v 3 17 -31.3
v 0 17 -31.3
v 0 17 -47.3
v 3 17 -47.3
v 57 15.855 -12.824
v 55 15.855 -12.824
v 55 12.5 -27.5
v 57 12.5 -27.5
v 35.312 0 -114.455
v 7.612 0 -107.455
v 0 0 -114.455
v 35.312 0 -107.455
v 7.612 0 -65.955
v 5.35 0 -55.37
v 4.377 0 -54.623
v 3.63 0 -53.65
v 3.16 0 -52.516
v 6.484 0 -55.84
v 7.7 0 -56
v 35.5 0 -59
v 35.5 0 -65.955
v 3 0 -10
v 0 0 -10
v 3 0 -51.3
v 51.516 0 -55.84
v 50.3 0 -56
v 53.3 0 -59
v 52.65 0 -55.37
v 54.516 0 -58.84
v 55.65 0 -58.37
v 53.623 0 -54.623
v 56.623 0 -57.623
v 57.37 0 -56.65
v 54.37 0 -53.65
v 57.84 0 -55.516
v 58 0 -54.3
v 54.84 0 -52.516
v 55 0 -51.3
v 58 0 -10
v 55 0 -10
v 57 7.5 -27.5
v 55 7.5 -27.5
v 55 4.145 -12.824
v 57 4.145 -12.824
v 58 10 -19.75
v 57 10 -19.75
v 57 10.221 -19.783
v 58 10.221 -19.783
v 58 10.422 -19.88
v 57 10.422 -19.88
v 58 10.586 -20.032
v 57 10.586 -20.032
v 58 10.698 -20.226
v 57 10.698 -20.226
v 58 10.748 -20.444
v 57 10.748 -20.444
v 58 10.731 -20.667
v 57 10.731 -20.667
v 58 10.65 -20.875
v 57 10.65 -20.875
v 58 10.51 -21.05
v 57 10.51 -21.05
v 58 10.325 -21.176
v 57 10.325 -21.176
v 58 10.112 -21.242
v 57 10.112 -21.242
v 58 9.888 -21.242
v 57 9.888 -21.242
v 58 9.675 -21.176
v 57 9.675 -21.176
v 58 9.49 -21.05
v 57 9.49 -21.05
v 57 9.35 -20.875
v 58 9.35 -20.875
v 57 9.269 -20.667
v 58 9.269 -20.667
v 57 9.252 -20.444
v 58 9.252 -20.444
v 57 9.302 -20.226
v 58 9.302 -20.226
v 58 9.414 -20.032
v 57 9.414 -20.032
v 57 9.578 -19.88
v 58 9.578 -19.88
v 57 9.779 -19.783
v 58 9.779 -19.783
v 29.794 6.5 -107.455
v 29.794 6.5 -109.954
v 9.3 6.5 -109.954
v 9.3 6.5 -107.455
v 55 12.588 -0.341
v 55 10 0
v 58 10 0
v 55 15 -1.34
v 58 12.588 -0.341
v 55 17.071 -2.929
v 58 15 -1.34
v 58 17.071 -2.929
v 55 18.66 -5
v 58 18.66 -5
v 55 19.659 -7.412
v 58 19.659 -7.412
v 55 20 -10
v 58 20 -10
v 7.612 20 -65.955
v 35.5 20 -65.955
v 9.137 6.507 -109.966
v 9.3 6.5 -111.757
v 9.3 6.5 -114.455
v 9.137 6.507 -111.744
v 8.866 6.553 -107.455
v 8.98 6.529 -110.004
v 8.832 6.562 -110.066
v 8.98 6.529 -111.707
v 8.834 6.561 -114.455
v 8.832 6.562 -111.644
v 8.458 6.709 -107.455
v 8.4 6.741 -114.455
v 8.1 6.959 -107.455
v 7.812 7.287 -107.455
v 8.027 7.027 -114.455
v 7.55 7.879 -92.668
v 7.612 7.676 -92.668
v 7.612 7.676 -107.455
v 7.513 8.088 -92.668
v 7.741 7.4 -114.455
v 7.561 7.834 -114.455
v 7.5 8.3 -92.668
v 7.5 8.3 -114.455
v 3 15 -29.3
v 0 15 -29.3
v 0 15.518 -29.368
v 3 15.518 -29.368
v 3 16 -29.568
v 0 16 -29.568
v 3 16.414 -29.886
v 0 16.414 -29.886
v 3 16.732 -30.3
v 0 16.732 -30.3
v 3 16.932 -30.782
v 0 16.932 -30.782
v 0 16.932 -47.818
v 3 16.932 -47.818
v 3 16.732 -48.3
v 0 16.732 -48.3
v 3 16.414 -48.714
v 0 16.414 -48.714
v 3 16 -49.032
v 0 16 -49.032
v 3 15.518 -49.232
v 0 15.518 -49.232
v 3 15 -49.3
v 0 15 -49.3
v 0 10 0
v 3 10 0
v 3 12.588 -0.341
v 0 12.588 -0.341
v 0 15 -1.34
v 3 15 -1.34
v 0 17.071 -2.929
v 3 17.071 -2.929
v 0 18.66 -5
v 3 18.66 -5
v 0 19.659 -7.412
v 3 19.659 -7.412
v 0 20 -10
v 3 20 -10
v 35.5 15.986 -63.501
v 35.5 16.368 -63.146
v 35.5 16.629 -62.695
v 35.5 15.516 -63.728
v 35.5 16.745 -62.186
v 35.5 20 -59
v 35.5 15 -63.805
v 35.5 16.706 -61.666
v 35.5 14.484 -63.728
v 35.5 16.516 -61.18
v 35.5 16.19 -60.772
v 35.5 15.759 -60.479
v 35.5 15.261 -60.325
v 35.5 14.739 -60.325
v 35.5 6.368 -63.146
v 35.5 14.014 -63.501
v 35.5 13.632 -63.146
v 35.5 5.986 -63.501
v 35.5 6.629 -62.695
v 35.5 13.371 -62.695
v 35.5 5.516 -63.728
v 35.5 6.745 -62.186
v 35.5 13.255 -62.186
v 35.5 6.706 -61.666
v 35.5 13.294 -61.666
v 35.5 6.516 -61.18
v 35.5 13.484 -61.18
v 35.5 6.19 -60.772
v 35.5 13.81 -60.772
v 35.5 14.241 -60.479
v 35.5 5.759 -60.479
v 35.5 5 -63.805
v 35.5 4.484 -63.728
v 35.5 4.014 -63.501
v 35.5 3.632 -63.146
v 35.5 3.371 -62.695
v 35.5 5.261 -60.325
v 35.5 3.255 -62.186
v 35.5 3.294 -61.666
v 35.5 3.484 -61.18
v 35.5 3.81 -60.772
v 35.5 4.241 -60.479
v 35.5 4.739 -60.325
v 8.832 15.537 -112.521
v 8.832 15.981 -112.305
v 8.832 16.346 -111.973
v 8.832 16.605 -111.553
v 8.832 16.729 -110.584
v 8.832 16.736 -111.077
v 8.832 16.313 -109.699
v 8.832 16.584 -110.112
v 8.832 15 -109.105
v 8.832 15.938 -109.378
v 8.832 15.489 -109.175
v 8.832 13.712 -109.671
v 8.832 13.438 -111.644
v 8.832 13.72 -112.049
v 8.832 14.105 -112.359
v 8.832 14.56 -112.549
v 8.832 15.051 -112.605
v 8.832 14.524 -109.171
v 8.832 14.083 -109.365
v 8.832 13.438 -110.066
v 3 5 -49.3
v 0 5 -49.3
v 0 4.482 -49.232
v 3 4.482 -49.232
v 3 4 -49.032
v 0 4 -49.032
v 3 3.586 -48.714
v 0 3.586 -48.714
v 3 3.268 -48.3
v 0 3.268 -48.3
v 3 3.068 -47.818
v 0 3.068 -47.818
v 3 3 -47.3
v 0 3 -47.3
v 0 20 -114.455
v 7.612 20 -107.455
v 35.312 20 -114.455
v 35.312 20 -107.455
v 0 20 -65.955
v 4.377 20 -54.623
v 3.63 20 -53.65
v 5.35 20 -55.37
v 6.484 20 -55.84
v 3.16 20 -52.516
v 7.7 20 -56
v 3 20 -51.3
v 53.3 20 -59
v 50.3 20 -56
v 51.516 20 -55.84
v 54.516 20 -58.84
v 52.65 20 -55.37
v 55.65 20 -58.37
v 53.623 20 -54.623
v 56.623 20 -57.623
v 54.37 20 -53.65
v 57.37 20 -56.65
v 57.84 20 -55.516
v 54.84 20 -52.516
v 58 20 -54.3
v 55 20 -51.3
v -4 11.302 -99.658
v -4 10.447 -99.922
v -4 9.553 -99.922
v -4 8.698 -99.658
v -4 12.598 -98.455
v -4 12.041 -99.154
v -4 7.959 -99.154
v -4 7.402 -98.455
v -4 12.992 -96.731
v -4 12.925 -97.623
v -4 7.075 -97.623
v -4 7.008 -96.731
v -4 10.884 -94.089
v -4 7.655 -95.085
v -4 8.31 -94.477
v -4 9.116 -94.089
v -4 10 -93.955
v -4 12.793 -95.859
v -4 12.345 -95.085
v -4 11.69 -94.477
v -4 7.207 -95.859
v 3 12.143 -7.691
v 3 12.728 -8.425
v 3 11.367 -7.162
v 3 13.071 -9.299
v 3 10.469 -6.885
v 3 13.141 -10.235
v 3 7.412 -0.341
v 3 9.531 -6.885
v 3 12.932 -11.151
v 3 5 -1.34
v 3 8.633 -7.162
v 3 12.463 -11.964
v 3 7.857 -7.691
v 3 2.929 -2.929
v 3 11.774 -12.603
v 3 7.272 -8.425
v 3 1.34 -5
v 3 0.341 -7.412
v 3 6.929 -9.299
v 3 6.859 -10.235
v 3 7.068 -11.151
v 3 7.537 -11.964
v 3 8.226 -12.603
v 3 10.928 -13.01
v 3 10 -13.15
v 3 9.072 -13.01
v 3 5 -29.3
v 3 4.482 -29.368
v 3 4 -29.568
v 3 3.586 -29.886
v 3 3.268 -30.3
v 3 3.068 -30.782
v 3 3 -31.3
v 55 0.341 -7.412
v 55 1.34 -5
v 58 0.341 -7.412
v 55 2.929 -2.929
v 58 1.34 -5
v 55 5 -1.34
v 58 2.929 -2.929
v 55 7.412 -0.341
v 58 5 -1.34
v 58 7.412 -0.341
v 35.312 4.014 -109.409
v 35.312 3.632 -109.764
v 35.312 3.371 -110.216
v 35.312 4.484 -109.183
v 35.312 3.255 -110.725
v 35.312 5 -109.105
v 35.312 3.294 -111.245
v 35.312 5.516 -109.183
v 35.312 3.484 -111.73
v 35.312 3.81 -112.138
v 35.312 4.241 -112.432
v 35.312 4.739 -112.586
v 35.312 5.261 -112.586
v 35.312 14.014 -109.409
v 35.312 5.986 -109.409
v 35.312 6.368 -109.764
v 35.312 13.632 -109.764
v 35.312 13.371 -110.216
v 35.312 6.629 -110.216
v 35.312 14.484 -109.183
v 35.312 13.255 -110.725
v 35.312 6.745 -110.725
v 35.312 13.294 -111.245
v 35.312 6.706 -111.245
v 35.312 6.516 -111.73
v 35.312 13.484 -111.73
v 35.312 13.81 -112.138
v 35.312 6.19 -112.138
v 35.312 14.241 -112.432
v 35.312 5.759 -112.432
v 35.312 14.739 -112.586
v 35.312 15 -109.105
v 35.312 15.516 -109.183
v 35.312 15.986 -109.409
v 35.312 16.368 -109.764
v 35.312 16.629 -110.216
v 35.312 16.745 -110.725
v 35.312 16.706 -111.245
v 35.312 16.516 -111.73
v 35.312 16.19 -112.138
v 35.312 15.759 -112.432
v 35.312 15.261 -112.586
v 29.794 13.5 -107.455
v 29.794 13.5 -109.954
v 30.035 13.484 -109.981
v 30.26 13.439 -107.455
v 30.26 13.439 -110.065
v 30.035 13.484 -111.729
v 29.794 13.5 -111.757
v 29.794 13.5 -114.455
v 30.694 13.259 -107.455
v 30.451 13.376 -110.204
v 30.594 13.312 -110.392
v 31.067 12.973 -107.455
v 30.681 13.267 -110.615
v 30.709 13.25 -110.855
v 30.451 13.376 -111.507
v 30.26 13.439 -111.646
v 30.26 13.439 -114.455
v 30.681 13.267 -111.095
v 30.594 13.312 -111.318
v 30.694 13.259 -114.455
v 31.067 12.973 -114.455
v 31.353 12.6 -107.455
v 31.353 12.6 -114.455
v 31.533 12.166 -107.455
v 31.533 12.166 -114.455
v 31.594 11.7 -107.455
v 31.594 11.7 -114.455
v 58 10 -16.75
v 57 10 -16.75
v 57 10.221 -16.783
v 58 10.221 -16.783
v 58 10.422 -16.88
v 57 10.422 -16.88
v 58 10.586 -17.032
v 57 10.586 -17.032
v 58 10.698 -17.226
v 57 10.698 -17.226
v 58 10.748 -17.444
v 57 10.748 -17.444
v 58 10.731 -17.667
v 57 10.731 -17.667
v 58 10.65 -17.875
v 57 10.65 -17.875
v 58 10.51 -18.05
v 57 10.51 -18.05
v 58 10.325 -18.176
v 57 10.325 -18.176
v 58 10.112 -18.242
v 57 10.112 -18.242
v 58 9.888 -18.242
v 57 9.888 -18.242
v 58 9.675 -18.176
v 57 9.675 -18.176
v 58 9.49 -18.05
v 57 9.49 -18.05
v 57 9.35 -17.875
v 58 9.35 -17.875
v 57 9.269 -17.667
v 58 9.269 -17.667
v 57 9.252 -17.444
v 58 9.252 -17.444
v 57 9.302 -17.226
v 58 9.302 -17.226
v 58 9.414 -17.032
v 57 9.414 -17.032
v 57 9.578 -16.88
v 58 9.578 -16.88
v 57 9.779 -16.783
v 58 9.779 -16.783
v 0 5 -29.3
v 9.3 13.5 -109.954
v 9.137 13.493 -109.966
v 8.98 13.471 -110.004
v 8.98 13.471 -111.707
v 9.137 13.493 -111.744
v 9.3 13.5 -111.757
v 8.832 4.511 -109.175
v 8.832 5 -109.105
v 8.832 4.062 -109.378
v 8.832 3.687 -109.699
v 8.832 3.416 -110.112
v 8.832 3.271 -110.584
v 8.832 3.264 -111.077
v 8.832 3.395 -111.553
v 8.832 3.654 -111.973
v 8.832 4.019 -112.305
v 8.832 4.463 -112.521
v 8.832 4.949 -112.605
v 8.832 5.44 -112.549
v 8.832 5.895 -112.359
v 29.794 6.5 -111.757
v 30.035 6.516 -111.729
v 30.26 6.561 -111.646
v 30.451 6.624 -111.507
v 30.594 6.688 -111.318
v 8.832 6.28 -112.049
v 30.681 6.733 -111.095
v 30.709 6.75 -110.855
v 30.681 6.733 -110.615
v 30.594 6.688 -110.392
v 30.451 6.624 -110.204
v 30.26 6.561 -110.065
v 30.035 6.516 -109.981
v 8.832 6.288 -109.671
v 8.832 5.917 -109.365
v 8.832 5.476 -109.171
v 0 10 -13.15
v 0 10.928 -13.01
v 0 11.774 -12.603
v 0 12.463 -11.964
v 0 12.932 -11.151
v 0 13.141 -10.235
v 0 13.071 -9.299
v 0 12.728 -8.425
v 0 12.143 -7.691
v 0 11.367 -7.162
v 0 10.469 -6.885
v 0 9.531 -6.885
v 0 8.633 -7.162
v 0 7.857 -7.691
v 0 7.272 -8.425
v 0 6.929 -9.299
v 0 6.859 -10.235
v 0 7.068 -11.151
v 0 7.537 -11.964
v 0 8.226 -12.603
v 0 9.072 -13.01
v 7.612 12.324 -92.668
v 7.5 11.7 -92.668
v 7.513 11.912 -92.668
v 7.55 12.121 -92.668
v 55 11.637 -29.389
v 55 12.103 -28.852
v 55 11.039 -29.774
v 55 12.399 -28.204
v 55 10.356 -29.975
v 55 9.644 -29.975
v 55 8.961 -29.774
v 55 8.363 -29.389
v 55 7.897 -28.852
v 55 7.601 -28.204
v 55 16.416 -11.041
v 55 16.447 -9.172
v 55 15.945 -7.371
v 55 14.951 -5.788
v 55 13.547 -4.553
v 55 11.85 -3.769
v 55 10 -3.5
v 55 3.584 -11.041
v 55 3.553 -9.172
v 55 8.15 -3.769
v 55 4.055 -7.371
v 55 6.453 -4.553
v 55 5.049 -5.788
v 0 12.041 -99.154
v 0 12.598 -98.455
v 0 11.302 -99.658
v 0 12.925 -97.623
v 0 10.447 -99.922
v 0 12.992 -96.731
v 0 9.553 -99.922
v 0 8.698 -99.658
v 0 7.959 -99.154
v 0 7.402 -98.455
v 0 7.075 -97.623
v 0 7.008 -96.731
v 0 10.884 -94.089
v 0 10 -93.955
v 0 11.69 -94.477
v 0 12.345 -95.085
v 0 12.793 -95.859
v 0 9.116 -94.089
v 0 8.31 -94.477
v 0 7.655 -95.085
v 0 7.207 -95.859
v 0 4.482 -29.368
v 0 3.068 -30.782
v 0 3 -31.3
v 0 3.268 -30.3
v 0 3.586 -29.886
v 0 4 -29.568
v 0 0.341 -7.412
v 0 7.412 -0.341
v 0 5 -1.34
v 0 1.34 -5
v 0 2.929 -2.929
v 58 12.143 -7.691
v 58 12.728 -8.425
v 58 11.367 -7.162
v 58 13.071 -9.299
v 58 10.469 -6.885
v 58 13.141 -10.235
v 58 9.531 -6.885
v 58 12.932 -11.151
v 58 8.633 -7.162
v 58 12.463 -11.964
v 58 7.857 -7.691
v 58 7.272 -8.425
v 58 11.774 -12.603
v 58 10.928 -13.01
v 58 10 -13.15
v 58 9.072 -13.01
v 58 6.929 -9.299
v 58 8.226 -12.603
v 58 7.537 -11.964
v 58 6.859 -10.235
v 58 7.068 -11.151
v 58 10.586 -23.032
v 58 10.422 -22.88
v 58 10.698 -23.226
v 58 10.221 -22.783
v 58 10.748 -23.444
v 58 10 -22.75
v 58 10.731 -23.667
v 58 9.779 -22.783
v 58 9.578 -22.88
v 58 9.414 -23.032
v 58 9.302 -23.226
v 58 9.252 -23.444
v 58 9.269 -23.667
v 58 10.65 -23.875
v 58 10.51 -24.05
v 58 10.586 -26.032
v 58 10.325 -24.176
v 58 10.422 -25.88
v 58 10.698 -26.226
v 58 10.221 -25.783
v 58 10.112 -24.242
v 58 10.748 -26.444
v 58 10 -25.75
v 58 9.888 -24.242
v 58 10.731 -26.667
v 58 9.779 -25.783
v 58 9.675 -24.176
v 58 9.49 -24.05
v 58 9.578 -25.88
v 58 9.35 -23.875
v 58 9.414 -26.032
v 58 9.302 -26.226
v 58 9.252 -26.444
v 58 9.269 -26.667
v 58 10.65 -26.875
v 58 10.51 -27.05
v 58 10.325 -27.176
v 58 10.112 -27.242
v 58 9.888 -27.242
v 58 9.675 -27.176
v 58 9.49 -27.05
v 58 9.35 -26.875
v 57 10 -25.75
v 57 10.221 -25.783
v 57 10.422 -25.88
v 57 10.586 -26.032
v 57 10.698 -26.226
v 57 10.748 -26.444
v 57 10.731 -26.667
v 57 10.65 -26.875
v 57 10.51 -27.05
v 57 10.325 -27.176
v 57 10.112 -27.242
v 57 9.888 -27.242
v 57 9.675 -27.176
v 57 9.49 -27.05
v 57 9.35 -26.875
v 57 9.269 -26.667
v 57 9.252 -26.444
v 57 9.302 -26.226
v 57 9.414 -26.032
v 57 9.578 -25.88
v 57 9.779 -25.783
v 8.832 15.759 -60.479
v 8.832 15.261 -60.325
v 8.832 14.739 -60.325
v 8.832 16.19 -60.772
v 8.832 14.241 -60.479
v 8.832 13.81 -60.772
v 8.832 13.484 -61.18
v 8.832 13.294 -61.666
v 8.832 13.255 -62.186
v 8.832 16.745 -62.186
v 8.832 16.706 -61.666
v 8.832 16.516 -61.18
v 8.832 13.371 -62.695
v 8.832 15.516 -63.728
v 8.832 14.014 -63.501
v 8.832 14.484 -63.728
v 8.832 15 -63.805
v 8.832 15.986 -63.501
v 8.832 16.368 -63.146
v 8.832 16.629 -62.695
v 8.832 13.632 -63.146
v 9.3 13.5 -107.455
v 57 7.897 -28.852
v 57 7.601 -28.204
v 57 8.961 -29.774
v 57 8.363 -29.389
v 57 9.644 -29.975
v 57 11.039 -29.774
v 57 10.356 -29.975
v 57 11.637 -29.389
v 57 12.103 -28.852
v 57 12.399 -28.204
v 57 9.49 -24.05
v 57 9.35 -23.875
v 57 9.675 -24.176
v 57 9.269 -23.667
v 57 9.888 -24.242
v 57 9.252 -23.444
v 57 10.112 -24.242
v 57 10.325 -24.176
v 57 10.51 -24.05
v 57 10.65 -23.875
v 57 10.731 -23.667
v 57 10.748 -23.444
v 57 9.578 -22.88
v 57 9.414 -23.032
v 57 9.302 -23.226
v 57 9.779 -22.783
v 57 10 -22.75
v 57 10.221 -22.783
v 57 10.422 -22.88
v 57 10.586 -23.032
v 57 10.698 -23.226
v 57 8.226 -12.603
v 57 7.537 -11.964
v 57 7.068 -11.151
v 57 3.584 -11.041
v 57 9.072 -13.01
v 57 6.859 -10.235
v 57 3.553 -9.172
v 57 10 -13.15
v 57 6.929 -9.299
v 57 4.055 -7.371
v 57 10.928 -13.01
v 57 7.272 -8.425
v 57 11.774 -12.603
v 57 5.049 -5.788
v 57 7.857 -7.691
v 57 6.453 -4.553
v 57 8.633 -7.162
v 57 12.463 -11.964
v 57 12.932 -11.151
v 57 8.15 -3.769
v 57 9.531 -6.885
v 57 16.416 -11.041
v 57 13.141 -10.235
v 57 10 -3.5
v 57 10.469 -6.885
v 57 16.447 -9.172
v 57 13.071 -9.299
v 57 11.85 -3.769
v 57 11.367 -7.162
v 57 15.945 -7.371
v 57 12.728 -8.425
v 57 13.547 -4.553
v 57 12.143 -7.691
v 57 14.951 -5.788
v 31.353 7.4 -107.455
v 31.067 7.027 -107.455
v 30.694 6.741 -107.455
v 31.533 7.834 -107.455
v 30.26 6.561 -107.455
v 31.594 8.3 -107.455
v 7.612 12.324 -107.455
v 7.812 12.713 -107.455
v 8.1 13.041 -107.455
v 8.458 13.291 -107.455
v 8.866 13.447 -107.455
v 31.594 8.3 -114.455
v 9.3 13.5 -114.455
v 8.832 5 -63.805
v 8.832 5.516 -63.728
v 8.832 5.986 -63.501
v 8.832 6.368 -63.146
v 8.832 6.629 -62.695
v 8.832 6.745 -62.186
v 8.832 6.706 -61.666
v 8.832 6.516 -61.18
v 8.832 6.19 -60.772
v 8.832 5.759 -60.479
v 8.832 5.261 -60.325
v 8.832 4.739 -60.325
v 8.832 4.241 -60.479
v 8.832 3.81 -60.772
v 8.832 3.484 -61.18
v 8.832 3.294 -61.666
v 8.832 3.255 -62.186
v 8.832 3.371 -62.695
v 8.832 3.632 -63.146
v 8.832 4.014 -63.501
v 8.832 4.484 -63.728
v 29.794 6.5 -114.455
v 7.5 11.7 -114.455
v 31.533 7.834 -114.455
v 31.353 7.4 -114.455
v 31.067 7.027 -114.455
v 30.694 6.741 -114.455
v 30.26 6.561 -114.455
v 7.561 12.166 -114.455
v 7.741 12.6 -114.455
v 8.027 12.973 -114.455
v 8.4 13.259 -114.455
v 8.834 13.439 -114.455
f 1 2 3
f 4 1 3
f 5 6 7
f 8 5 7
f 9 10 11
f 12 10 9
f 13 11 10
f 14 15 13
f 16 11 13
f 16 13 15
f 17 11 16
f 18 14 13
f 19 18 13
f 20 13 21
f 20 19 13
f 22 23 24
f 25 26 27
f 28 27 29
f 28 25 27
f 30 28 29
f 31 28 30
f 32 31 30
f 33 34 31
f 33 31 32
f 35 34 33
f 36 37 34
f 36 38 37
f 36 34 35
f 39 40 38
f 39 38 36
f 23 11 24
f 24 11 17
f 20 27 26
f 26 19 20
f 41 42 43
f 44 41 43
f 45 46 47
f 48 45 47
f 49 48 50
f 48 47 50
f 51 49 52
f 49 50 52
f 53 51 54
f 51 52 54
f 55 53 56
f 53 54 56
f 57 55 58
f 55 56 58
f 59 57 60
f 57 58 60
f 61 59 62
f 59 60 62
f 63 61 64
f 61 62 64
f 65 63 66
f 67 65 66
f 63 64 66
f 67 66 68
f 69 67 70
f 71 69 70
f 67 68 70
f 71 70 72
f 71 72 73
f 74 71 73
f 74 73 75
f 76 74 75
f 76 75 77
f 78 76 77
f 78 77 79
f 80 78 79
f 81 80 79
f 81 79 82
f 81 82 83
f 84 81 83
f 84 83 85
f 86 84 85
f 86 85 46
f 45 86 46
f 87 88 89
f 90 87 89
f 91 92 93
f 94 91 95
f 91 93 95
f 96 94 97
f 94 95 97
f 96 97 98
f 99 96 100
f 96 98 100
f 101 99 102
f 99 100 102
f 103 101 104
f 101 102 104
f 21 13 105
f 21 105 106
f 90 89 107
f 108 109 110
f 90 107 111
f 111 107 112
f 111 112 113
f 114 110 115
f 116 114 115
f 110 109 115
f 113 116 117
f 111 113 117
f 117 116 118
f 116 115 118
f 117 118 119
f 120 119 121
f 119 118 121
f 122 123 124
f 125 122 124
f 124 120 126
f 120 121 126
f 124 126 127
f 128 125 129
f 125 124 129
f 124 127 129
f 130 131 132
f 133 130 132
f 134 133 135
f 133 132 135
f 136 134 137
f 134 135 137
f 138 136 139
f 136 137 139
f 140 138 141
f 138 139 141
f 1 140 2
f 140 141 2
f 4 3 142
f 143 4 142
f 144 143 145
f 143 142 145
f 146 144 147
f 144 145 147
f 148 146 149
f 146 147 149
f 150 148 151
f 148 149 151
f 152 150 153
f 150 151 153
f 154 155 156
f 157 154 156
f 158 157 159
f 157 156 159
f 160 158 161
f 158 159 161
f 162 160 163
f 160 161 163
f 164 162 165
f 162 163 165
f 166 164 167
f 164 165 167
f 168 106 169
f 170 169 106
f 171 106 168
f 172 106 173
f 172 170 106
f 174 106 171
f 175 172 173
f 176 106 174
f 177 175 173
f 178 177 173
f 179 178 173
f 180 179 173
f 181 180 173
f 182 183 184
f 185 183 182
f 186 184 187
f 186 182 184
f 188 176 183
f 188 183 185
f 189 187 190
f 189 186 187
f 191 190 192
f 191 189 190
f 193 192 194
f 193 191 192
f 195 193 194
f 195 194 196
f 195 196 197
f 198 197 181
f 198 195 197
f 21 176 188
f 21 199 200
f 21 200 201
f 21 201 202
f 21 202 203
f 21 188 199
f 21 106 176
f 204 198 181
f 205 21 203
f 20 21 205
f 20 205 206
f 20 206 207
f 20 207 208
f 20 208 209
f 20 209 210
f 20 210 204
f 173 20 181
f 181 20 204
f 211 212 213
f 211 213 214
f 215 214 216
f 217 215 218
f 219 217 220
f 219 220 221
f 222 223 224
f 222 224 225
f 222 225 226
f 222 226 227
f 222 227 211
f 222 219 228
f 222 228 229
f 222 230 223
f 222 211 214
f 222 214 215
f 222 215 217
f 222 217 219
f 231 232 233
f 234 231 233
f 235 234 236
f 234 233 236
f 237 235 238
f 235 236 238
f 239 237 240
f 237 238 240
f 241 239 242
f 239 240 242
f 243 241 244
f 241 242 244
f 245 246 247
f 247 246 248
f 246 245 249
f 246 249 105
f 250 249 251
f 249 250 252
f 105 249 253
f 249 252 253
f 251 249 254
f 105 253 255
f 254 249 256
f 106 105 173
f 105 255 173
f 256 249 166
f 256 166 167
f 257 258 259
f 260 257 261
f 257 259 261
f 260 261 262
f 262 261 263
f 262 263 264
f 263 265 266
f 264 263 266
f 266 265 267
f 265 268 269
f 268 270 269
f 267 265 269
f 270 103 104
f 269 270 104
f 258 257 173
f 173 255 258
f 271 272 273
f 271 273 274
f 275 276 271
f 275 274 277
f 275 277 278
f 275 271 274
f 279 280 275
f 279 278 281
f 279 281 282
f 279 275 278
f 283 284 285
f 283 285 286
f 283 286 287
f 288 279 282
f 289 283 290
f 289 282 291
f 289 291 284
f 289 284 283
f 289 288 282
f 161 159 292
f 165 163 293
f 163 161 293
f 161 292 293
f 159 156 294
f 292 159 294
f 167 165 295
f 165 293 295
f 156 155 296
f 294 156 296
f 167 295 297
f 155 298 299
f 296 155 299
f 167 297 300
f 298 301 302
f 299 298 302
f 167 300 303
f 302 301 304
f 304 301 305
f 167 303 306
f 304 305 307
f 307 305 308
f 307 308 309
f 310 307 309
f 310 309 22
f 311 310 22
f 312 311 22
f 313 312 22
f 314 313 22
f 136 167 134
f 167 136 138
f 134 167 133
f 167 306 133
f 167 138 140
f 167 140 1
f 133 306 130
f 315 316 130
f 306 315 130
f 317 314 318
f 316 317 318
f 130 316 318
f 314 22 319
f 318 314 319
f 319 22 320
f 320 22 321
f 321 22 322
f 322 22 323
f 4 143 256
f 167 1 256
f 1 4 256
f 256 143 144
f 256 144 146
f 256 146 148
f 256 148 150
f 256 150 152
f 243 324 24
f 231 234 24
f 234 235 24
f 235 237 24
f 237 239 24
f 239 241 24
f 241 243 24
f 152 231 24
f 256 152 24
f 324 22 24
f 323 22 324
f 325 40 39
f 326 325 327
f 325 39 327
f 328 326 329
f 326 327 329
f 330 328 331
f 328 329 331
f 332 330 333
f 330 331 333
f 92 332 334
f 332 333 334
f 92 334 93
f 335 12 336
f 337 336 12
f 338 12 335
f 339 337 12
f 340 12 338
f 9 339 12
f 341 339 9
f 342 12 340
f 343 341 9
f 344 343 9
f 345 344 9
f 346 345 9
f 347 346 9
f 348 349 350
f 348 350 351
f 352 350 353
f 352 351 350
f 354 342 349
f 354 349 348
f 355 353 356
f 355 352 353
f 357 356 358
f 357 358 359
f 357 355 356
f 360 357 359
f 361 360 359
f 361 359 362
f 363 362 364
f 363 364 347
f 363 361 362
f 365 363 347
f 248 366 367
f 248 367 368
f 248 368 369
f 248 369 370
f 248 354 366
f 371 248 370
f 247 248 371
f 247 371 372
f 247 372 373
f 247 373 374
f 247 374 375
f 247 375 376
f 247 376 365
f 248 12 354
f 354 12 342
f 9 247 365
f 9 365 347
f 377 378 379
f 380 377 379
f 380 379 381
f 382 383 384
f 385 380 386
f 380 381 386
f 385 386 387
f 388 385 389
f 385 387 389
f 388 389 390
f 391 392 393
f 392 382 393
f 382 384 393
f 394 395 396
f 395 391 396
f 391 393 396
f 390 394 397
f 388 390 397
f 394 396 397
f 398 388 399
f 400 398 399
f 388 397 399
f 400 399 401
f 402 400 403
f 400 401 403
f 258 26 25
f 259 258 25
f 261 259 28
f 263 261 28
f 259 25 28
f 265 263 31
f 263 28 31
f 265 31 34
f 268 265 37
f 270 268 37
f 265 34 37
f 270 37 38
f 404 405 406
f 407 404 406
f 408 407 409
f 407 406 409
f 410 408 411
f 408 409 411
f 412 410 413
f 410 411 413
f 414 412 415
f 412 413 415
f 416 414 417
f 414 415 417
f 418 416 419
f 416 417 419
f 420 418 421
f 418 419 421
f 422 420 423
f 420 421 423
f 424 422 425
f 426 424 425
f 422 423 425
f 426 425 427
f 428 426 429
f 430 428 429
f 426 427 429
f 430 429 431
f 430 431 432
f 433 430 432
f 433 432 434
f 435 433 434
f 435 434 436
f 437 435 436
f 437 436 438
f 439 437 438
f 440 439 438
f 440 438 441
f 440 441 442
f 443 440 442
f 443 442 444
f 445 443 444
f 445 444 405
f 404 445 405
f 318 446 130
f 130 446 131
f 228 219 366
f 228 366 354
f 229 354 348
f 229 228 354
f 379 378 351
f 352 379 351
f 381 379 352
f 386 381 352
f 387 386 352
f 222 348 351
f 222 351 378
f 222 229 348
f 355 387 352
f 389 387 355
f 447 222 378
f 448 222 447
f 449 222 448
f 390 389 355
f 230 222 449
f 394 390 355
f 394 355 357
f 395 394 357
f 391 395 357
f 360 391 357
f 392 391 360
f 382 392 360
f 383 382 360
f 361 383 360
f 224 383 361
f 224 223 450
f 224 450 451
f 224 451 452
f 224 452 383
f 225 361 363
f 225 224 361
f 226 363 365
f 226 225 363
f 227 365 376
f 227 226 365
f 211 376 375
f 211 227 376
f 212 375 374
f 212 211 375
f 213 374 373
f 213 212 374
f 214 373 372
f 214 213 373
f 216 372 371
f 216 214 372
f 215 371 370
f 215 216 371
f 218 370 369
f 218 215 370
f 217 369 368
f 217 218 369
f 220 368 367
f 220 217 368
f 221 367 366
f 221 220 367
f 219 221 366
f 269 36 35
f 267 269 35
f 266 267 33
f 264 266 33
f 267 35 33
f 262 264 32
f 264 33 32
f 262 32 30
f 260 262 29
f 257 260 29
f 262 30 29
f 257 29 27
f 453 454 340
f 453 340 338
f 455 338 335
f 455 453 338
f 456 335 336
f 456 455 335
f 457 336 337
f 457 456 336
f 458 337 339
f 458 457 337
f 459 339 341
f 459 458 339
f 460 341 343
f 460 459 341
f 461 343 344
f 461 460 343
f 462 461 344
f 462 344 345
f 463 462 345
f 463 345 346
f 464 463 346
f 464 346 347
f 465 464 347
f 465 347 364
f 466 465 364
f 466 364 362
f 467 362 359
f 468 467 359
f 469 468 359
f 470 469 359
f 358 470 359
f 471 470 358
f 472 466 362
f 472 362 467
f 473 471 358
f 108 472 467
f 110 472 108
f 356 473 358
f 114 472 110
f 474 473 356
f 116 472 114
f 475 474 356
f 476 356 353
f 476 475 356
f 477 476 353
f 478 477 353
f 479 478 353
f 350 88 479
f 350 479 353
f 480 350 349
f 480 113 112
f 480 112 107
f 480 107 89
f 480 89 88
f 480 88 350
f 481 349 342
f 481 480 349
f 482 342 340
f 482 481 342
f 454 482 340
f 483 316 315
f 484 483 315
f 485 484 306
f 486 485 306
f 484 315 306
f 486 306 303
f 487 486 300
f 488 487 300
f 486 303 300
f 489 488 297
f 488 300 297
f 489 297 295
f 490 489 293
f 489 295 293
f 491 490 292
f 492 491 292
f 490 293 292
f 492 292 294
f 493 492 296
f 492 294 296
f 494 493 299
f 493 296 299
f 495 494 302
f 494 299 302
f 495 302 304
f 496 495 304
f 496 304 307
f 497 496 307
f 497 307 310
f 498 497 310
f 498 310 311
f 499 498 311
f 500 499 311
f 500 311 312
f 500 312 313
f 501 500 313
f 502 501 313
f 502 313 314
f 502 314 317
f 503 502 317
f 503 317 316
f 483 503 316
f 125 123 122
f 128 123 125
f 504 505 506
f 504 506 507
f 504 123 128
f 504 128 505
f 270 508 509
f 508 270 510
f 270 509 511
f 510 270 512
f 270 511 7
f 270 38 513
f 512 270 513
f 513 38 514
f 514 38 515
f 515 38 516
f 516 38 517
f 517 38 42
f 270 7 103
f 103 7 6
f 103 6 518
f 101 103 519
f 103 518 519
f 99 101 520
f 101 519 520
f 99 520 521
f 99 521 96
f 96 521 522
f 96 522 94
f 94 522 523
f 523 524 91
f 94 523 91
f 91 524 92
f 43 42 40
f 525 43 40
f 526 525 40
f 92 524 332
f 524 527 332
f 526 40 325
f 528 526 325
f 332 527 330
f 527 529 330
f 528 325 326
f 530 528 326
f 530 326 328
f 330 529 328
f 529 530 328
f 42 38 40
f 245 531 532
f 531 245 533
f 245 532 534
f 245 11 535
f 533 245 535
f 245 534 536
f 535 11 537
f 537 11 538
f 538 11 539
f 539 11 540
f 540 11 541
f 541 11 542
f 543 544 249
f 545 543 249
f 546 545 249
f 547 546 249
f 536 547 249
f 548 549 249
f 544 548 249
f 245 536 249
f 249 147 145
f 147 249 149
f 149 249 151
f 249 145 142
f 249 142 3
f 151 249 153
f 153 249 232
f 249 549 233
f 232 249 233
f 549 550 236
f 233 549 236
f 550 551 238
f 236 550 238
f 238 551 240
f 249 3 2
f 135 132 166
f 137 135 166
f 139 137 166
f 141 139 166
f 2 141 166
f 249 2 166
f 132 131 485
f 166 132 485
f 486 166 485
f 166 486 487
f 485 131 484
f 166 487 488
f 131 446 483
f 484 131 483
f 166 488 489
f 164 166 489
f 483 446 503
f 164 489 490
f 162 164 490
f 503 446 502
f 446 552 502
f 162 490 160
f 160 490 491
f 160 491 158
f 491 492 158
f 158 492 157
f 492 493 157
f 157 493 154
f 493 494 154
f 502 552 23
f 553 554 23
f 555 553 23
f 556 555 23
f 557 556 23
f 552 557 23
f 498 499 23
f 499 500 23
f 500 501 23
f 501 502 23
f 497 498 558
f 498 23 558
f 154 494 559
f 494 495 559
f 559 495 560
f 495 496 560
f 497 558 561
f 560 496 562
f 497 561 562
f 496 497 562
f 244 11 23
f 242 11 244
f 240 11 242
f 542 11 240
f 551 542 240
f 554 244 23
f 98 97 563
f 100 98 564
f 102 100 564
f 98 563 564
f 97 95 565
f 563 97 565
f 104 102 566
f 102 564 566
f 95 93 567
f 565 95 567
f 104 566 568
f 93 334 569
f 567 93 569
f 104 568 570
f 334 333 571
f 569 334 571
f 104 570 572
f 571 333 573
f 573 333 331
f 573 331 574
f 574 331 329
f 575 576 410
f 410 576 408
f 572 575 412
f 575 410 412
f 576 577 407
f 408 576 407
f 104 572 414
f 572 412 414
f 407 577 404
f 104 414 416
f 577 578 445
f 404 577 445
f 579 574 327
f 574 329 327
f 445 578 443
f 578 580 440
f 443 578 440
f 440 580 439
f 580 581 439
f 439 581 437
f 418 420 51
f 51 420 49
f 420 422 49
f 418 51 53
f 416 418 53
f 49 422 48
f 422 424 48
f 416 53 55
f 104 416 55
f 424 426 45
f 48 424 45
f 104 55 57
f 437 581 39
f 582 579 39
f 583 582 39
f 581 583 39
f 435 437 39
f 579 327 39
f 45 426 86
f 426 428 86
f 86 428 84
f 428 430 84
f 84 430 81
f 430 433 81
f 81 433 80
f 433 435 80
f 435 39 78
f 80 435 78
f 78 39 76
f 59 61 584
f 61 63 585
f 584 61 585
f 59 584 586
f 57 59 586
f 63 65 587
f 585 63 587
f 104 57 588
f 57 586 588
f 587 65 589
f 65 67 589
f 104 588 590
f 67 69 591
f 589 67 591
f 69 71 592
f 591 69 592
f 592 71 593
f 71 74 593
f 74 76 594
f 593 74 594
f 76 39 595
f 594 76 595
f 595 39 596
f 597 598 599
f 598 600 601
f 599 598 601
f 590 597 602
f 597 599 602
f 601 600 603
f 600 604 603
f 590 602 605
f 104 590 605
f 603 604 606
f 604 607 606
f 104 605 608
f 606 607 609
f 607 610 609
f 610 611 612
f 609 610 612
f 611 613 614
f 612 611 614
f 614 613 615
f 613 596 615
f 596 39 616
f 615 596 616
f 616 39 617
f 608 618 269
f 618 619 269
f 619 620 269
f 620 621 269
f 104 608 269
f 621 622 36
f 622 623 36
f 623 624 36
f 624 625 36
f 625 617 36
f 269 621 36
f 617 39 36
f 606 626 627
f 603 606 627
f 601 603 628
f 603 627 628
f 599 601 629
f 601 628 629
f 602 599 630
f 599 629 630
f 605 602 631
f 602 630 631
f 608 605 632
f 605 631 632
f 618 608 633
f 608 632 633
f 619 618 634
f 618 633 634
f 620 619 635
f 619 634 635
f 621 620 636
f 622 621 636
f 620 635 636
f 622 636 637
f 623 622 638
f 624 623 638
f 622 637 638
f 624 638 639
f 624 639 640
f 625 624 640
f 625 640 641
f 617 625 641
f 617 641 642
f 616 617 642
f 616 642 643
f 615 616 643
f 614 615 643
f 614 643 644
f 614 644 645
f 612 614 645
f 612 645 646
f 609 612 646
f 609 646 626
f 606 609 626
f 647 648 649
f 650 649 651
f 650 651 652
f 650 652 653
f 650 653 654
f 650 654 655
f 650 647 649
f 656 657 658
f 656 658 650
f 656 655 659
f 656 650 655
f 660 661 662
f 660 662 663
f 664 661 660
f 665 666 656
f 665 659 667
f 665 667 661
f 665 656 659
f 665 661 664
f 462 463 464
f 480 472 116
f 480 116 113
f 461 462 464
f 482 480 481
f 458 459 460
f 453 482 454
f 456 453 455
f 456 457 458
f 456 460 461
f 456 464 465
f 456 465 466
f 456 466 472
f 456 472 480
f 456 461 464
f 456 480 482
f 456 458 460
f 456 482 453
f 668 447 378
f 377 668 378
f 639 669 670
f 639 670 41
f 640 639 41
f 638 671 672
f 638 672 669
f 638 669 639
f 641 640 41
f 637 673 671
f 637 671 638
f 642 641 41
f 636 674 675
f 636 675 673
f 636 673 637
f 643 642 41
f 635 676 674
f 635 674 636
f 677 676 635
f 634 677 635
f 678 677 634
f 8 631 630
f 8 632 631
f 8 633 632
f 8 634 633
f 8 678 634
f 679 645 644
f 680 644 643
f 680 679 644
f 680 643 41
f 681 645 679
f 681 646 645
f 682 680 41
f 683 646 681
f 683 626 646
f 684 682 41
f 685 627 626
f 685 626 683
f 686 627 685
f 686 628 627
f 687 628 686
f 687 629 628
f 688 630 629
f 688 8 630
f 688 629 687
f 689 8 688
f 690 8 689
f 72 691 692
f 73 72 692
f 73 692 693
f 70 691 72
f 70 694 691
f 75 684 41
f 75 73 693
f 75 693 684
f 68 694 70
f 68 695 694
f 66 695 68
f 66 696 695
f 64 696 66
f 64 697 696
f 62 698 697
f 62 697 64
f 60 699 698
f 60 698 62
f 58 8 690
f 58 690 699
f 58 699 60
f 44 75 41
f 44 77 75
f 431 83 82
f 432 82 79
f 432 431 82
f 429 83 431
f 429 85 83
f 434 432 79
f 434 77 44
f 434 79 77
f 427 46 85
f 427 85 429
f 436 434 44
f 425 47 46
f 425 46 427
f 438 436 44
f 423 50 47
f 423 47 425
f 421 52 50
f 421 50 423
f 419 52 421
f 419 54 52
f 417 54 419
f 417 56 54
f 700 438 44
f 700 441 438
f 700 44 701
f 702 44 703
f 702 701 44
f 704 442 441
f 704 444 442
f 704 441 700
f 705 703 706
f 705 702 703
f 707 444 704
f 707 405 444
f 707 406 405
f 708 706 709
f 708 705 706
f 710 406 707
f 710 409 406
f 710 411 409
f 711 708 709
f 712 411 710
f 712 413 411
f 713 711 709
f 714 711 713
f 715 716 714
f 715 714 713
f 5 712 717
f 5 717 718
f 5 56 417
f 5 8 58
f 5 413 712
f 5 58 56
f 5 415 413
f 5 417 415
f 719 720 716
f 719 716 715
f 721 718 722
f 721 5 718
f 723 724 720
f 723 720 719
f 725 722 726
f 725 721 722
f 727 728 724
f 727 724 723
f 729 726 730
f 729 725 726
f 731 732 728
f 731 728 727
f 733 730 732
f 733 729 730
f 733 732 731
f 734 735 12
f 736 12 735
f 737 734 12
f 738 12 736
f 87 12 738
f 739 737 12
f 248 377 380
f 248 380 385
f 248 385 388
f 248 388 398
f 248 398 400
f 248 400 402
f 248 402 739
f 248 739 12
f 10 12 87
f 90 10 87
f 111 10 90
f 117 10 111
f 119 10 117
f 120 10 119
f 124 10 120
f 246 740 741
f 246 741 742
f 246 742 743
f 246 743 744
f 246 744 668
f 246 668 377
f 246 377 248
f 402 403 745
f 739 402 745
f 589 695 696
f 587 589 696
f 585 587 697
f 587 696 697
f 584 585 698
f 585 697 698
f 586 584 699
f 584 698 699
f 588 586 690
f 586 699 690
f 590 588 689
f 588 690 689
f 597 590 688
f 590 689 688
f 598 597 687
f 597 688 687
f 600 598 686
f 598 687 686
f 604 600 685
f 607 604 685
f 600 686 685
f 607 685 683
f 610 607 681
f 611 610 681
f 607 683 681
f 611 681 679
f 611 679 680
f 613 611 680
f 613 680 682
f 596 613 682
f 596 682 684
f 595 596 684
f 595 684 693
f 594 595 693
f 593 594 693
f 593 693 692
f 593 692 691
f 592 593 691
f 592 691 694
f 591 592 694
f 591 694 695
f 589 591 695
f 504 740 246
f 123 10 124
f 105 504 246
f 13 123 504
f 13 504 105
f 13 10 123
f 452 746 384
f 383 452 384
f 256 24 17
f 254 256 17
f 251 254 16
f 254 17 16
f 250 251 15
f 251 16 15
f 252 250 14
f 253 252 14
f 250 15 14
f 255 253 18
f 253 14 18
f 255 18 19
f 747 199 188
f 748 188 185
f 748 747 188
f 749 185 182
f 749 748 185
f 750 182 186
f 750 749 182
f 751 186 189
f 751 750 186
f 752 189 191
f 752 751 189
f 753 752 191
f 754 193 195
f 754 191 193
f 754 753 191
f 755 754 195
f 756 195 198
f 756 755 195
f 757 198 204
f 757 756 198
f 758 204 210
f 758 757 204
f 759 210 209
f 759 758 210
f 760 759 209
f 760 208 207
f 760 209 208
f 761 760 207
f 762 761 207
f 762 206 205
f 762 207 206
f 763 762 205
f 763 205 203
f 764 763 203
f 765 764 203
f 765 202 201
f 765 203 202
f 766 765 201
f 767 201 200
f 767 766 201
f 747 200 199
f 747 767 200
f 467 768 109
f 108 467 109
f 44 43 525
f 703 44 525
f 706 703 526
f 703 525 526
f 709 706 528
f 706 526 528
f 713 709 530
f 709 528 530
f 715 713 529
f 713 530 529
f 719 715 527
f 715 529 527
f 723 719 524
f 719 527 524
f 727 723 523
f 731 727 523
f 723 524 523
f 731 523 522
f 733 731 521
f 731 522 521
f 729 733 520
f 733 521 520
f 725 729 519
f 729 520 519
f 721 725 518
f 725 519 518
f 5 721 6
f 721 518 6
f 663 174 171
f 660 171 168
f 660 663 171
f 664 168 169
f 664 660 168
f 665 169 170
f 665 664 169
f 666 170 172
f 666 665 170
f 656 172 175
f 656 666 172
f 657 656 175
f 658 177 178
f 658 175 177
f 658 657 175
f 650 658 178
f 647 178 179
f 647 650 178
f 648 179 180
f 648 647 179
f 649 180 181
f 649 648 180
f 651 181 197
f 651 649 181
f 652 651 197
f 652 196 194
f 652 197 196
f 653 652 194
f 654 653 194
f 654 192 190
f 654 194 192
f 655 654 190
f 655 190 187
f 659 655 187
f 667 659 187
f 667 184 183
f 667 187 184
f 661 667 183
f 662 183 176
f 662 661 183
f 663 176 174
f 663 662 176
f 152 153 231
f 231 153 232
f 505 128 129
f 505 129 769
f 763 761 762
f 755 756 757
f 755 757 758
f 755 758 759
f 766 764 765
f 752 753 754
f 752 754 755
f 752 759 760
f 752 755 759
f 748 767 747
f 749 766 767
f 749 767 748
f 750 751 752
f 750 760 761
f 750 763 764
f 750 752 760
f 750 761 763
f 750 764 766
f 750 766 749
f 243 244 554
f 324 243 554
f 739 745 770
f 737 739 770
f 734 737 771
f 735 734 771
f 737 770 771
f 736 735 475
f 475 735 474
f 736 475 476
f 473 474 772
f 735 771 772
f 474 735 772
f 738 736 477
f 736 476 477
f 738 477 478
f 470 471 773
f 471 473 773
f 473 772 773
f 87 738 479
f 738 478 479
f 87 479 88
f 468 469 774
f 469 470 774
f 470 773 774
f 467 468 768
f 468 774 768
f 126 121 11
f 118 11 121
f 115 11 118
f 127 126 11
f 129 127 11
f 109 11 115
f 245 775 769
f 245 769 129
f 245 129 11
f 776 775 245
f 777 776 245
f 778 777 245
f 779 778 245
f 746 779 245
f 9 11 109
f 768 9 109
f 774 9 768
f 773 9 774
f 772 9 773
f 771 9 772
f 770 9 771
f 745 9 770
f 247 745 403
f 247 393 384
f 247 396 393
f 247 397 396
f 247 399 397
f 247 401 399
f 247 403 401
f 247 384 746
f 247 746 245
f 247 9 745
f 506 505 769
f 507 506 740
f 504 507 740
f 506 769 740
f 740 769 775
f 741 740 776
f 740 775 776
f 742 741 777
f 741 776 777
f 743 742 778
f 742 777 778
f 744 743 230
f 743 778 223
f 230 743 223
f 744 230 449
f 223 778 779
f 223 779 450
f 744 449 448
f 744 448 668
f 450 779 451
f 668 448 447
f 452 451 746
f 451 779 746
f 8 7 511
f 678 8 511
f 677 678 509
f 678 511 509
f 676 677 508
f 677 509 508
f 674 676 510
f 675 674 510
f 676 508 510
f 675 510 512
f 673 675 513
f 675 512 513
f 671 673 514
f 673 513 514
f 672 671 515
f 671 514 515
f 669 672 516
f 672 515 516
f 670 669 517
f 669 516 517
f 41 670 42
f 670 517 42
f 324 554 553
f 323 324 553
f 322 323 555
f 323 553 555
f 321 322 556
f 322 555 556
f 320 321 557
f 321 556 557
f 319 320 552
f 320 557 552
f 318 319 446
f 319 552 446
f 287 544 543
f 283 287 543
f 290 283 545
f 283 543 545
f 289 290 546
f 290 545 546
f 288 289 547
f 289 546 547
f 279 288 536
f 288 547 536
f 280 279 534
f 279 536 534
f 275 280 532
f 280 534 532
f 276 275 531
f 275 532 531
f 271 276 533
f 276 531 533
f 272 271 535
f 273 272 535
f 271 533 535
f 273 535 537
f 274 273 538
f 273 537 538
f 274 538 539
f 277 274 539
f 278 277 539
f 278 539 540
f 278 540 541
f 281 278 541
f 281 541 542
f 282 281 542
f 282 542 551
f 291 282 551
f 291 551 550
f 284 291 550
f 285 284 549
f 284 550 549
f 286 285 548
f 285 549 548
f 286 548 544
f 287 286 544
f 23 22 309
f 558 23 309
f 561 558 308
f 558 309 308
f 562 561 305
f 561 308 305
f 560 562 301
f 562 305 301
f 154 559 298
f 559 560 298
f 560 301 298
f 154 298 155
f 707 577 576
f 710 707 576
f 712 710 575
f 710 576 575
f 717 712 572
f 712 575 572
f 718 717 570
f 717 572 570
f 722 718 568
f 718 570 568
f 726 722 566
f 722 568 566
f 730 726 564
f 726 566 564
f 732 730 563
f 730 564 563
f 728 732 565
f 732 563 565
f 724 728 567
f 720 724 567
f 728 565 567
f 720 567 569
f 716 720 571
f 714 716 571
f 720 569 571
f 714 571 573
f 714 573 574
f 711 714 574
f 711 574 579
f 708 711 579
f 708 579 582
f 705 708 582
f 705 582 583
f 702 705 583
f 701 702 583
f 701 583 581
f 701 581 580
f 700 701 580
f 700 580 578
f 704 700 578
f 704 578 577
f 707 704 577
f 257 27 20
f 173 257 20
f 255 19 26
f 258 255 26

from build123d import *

# Parameters (mm, degrees)
AUFSATZ_LINEAR_AUSTRAGEN1_DEPTH      = 20
SCHNITT_LINEAR_AUSTRAGEN1_DEPTH      = 86.117565755
SKIZZE3_R                            = 3.15
SCHNITT_LINEAR_AUSTRAGEN2_DEPTH      = 86.117565755
SCHNITT_LINEAR_AUSTRAGEN3_DEPTH      = 2
SKIZZE5_R                            = 0.75
SCHNITT_LINEAR_AUSTRAGEN4_DEPTH      = 2
SKIZZE6_W                            = 35.5
SKIZZE6_H                            = 6.955295524
AUFSATZ_LINEAR_AUSTRAGEN2_DEPTH      = 20
SKIZZE7_W                            = 7.611739691
SKIZZE7_H                            = 53.192525908
AUFSATZ_LINEAR_AUSTRAGEN3_DEPTH      = 20
SKIZZE8_W                            = 7
SKIZZE8_H                            = 20
AUFSATZ_LINEAR_AUSTRAGEN4_DEPTH      = 27.7
SCHNITT_LINEAR_AUSTRAGEN5_DEPTH      = 26.48
SCHNITT_LINEAR_AUSTRAGEN6_DEPTH      = 6
SCHNITT_LINEAR_AUSTRAGEN6_DEPTH_BACK = 26.48
SKIZZE10_R                           = 1.75
SKIZZE11_R                           = 3
AUFSATZ_LINEAR_AUSTRAGEN5_DEPTH      = 4
SKIZZE12_W                           = 4.692525908
SKIZZE12_H                           = 20
SCHNITT_LINEAR_AUSTRAGEN7_DEPTH      = 131.901413869
SCHNITT_LINEAR_AUSTRAGEN8_DEPTH      = 6.73


with BuildPart() as part:
    # Skizze1 → Aufsatz-Linear austragen1 (new body)
    with BuildSketch(Plane(origin=(0, 0, 0), x_dir=(1, 0, 0), z_dir=(0, 1, 0))):
        with BuildLine():
            Line((0, 59), (0, 0))
            Line((0, 0), (3, 0))
            Line((3, 0), (3, 51.3))
            ThreePointArc((3, 51.3), (4.376598128, 54.623401872), (7.7, 56))
            Line((7.7, 56), (50.3, 56))
            ThreePointArc((50.3, 56), (53.623401872, 54.623401872), (55, 51.3))
            Line((55, 51.3), (55, 0))
            Line((55, 0), (58, 0))
            Line((58, 0), (58, 54.3))
            ThreePointArc((58, 54.3), (56.623401872, 57.623401872), (53.3, 59))
            Line((53.3, 59), (0, 59))
        make_face()
    extrude(amount=AUFSATZ_LINEAR_AUSTRAGEN1_DEPTH)

    # Skizze2 → Schnitt-Linear austragen1 (cut, through all)
    with BuildSketch(Plane(origin=(58, 0, 0), x_dir=(0, 0, -1), z_dir=(1, 0, 0))):
        with BuildLine():
            ThreePointArc((0, 10), (2.928932188, 17.071067812), (10, 20))
            Line((10, 20), (0, 20))
            Line((0, 20), (0, 10))
        make_face()
        with BuildLine():
            ThreePointArc((10, 0), (2.928932188, 2.928932188), (0, 10))
            Line((0, 10), (0, 0))
            Line((0, 0), (10, 0))
        make_face()
    extrude(amount=-SCHNITT_LINEAR_AUSTRAGEN1_DEPTH, mode=Mode.SUBTRACT)

    # Skizze3 → Schnitt-Linear austragen2 (cut, through all)
    with BuildSketch(Plane(origin=(58, 0, 0), x_dir=(0, 0, -1), z_dir=(1, 0, 0))):
        with Locations((10, 10)):
            Circle(SKIZZE3_R)
    extrude(amount=-SCHNITT_LINEAR_AUSTRAGEN2_DEPTH, mode=Mode.SUBTRACT)

    # Skizze4 → Schnitt-Linear austragen3 (cut)
    with BuildSketch(Plane.ZY.offset(-55)):
        with BuildLine():
            Line((-27.5, 7.5), (-12.823894492, 4.145461598))
            ThreePointArc((-12.823894492, 4.145461598), (-3.5, 10), (-12.823894492, 15.854538402))
            Line((-12.823894492, 15.854538402), (-27.5, 12.5))
            ThreePointArc((-27.5, 12.5), (-30, 10), (-27.5, 7.5))
        make_face()
    extrude(amount=-SCHNITT_LINEAR_AUSTRAGEN3_DEPTH, mode=Mode.SUBTRACT)

    # Skizze5 → Schnitt-Linear austragen4 (cut)
    with BuildSketch(Plane.ZY.offset(-57)):
        with Locations((-26.5, 10)):
            Circle(SKIZZE5_R)
        with Locations((-23.5, 10)):
            Circle(SKIZZE5_R)
        with Locations((-20.5, 10)):
            Circle(SKIZZE5_R)
        with Locations((-17.5, 10)):
            Circle(SKIZZE5_R)
    extrude(amount=-SCHNITT_LINEAR_AUSTRAGEN4_DEPTH, mode=Mode.SUBTRACT)

    # Skizze6 → Aufsatz-Linear austragen2 (add)
    with BuildSketch(Plane.XZ):
        with Locations((17.75, -62.477647762)):
            Rectangle(SKIZZE6_W, SKIZZE6_H)
    extrude(amount=-AUFSATZ_LINEAR_AUSTRAGEN2_DEPTH)

    # Skizze7 → Aufsatz-Linear austragen3 (add)
    with BuildSketch(Plane.XZ):
        with Locations((3.805869846, -92.551558478)):
            Rectangle(SKIZZE7_W, SKIZZE7_H)
    extrude(amount=-AUFSATZ_LINEAR_AUSTRAGEN3_DEPTH)

    # Skizze8 → Aufsatz-Linear austragen4 (add)
    with BuildSketch(Plane(origin=(7.611739691, 0, 0), x_dir=(0, 0, -1), z_dir=(1, 0, 0))):
        with Locations((110.955295524, 10)):
            Rectangle(SKIZZE8_W, SKIZZE8_H)
    extrude(amount=AUFSATZ_LINEAR_AUSTRAGEN4_DEPTH)

    # Skizze9 → Schnitt-Linear austragen5 (cut)
    with BuildSketch(Plane(origin=(0, 0, -119.147821432), x_dir=(-1, 0, 0), z_dir=(0, 0, -1))):
        with BuildLine():
            Line((-9.3, 13.5), (-29.794038703, 13.5))
            ThreePointArc((-29.794038703, 13.5), (-31.066830909, 12.972792206), (-31.594038703, 11.7))
            Line((-31.594038703, 11.7), (-31.594038703, 8.3))
            ThreePointArc((-31.594038703, 8.3), (-31.066830909, 7.027207794), (-29.794038703, 6.5))
            Line((-29.794038703, 6.5), (-9.3, 6.5))
            ThreePointArc((-9.3, 6.5), (-8.027207794, 7.027207794), (-7.5, 8.3))
            Line((-7.5, 8.3), (-7.5, 11.7))
            ThreePointArc((-7.5, 11.7), (-8.027207794, 12.972792206), (-9.3, 13.5))
        make_face()
    extrude(amount=-SCHNITT_LINEAR_AUSTRAGEN5_DEPTH, mode=Mode.SUBTRACT)

    # Skizze10 → Schnitt-Linear austragen6 (cut, two sides: drawn at the far end of the back side and taken through both)
    with BuildSketch(Plane(origin=(35.311739691, 0, 0), x_dir=(0, 0, -1), z_dir=(1, 0, 0)).offset(-SCHNITT_LINEAR_AUSTRAGEN6_DEPTH_BACK)):
        with Locations((62.055295524, 15)):
            Circle(SKIZZE10_R)
        with Locations((62.055295524, 5)):
            Circle(SKIZZE10_R)
        with Locations(Location((110.855295524, 5, 0), (0, 0, 180))):
            Circle(SKIZZE10_R)
        with Locations(Location((110.855295524, 15, 0), (0, 0, 180))):
            Circle(SKIZZE10_R)
    extrude(amount=SCHNITT_LINEAR_AUSTRAGEN6_DEPTH + SCHNITT_LINEAR_AUSTRAGEN6_DEPTH_BACK, mode=Mode.SUBTRACT)

    # Skizze11 → Aufsatz-Linear austragen5 (add)
    with BuildSketch(Plane.ZY):
        with Locations((-96.955295524, 10)):
            Circle(SKIZZE11_R)
    extrude(amount=AUFSATZ_LINEAR_AUSTRAGEN5_DEPTH)

    # Skizze12 → Schnitt-Linear austragen7 (cut, through all)
    with BuildSketch(Plane(origin=(7.611739691, 0, 0), x_dir=(0, 0, -1), z_dir=(1, 0, 0))):
        with Locations((116.801558478, 10)):
            Rectangle(SKIZZE12_W, SKIZZE12_H)
    extrude(amount=-SCHNITT_LINEAR_AUSTRAGEN7_DEPTH, mode=Mode.SUBTRACT)

    # Skizze13 → Schnitt-Linear austragen8 (cut)
    with BuildSketch(Plane.ZY):
        with BuildLine():
            Line((-47.3, 3), (-31.3, 3))
            ThreePointArc((-31.3, 3), (-29.885786438, 3.585786438), (-29.3, 5))
            Line((-29.3, 5), (-29.3, 15))
            ThreePointArc((-29.3, 15), (-29.885786438, 16.414213562), (-31.3, 17))
            Line((-31.3, 17), (-47.3, 17))
            ThreePointArc((-47.3, 17), (-48.714213562, 16.414213562), (-49.3, 15))
            Line((-49.3, 15), (-49.3, 5))
            ThreePointArc((-49.3, 5), (-48.714213562, 3.585786438), (-47.3, 3))
        make_face()
    extrude(amount=-SCHNITT_LINEAR_AUSTRAGEN8_DEPTH, mode=Mode.SUBTRACT)


solid = part.part
